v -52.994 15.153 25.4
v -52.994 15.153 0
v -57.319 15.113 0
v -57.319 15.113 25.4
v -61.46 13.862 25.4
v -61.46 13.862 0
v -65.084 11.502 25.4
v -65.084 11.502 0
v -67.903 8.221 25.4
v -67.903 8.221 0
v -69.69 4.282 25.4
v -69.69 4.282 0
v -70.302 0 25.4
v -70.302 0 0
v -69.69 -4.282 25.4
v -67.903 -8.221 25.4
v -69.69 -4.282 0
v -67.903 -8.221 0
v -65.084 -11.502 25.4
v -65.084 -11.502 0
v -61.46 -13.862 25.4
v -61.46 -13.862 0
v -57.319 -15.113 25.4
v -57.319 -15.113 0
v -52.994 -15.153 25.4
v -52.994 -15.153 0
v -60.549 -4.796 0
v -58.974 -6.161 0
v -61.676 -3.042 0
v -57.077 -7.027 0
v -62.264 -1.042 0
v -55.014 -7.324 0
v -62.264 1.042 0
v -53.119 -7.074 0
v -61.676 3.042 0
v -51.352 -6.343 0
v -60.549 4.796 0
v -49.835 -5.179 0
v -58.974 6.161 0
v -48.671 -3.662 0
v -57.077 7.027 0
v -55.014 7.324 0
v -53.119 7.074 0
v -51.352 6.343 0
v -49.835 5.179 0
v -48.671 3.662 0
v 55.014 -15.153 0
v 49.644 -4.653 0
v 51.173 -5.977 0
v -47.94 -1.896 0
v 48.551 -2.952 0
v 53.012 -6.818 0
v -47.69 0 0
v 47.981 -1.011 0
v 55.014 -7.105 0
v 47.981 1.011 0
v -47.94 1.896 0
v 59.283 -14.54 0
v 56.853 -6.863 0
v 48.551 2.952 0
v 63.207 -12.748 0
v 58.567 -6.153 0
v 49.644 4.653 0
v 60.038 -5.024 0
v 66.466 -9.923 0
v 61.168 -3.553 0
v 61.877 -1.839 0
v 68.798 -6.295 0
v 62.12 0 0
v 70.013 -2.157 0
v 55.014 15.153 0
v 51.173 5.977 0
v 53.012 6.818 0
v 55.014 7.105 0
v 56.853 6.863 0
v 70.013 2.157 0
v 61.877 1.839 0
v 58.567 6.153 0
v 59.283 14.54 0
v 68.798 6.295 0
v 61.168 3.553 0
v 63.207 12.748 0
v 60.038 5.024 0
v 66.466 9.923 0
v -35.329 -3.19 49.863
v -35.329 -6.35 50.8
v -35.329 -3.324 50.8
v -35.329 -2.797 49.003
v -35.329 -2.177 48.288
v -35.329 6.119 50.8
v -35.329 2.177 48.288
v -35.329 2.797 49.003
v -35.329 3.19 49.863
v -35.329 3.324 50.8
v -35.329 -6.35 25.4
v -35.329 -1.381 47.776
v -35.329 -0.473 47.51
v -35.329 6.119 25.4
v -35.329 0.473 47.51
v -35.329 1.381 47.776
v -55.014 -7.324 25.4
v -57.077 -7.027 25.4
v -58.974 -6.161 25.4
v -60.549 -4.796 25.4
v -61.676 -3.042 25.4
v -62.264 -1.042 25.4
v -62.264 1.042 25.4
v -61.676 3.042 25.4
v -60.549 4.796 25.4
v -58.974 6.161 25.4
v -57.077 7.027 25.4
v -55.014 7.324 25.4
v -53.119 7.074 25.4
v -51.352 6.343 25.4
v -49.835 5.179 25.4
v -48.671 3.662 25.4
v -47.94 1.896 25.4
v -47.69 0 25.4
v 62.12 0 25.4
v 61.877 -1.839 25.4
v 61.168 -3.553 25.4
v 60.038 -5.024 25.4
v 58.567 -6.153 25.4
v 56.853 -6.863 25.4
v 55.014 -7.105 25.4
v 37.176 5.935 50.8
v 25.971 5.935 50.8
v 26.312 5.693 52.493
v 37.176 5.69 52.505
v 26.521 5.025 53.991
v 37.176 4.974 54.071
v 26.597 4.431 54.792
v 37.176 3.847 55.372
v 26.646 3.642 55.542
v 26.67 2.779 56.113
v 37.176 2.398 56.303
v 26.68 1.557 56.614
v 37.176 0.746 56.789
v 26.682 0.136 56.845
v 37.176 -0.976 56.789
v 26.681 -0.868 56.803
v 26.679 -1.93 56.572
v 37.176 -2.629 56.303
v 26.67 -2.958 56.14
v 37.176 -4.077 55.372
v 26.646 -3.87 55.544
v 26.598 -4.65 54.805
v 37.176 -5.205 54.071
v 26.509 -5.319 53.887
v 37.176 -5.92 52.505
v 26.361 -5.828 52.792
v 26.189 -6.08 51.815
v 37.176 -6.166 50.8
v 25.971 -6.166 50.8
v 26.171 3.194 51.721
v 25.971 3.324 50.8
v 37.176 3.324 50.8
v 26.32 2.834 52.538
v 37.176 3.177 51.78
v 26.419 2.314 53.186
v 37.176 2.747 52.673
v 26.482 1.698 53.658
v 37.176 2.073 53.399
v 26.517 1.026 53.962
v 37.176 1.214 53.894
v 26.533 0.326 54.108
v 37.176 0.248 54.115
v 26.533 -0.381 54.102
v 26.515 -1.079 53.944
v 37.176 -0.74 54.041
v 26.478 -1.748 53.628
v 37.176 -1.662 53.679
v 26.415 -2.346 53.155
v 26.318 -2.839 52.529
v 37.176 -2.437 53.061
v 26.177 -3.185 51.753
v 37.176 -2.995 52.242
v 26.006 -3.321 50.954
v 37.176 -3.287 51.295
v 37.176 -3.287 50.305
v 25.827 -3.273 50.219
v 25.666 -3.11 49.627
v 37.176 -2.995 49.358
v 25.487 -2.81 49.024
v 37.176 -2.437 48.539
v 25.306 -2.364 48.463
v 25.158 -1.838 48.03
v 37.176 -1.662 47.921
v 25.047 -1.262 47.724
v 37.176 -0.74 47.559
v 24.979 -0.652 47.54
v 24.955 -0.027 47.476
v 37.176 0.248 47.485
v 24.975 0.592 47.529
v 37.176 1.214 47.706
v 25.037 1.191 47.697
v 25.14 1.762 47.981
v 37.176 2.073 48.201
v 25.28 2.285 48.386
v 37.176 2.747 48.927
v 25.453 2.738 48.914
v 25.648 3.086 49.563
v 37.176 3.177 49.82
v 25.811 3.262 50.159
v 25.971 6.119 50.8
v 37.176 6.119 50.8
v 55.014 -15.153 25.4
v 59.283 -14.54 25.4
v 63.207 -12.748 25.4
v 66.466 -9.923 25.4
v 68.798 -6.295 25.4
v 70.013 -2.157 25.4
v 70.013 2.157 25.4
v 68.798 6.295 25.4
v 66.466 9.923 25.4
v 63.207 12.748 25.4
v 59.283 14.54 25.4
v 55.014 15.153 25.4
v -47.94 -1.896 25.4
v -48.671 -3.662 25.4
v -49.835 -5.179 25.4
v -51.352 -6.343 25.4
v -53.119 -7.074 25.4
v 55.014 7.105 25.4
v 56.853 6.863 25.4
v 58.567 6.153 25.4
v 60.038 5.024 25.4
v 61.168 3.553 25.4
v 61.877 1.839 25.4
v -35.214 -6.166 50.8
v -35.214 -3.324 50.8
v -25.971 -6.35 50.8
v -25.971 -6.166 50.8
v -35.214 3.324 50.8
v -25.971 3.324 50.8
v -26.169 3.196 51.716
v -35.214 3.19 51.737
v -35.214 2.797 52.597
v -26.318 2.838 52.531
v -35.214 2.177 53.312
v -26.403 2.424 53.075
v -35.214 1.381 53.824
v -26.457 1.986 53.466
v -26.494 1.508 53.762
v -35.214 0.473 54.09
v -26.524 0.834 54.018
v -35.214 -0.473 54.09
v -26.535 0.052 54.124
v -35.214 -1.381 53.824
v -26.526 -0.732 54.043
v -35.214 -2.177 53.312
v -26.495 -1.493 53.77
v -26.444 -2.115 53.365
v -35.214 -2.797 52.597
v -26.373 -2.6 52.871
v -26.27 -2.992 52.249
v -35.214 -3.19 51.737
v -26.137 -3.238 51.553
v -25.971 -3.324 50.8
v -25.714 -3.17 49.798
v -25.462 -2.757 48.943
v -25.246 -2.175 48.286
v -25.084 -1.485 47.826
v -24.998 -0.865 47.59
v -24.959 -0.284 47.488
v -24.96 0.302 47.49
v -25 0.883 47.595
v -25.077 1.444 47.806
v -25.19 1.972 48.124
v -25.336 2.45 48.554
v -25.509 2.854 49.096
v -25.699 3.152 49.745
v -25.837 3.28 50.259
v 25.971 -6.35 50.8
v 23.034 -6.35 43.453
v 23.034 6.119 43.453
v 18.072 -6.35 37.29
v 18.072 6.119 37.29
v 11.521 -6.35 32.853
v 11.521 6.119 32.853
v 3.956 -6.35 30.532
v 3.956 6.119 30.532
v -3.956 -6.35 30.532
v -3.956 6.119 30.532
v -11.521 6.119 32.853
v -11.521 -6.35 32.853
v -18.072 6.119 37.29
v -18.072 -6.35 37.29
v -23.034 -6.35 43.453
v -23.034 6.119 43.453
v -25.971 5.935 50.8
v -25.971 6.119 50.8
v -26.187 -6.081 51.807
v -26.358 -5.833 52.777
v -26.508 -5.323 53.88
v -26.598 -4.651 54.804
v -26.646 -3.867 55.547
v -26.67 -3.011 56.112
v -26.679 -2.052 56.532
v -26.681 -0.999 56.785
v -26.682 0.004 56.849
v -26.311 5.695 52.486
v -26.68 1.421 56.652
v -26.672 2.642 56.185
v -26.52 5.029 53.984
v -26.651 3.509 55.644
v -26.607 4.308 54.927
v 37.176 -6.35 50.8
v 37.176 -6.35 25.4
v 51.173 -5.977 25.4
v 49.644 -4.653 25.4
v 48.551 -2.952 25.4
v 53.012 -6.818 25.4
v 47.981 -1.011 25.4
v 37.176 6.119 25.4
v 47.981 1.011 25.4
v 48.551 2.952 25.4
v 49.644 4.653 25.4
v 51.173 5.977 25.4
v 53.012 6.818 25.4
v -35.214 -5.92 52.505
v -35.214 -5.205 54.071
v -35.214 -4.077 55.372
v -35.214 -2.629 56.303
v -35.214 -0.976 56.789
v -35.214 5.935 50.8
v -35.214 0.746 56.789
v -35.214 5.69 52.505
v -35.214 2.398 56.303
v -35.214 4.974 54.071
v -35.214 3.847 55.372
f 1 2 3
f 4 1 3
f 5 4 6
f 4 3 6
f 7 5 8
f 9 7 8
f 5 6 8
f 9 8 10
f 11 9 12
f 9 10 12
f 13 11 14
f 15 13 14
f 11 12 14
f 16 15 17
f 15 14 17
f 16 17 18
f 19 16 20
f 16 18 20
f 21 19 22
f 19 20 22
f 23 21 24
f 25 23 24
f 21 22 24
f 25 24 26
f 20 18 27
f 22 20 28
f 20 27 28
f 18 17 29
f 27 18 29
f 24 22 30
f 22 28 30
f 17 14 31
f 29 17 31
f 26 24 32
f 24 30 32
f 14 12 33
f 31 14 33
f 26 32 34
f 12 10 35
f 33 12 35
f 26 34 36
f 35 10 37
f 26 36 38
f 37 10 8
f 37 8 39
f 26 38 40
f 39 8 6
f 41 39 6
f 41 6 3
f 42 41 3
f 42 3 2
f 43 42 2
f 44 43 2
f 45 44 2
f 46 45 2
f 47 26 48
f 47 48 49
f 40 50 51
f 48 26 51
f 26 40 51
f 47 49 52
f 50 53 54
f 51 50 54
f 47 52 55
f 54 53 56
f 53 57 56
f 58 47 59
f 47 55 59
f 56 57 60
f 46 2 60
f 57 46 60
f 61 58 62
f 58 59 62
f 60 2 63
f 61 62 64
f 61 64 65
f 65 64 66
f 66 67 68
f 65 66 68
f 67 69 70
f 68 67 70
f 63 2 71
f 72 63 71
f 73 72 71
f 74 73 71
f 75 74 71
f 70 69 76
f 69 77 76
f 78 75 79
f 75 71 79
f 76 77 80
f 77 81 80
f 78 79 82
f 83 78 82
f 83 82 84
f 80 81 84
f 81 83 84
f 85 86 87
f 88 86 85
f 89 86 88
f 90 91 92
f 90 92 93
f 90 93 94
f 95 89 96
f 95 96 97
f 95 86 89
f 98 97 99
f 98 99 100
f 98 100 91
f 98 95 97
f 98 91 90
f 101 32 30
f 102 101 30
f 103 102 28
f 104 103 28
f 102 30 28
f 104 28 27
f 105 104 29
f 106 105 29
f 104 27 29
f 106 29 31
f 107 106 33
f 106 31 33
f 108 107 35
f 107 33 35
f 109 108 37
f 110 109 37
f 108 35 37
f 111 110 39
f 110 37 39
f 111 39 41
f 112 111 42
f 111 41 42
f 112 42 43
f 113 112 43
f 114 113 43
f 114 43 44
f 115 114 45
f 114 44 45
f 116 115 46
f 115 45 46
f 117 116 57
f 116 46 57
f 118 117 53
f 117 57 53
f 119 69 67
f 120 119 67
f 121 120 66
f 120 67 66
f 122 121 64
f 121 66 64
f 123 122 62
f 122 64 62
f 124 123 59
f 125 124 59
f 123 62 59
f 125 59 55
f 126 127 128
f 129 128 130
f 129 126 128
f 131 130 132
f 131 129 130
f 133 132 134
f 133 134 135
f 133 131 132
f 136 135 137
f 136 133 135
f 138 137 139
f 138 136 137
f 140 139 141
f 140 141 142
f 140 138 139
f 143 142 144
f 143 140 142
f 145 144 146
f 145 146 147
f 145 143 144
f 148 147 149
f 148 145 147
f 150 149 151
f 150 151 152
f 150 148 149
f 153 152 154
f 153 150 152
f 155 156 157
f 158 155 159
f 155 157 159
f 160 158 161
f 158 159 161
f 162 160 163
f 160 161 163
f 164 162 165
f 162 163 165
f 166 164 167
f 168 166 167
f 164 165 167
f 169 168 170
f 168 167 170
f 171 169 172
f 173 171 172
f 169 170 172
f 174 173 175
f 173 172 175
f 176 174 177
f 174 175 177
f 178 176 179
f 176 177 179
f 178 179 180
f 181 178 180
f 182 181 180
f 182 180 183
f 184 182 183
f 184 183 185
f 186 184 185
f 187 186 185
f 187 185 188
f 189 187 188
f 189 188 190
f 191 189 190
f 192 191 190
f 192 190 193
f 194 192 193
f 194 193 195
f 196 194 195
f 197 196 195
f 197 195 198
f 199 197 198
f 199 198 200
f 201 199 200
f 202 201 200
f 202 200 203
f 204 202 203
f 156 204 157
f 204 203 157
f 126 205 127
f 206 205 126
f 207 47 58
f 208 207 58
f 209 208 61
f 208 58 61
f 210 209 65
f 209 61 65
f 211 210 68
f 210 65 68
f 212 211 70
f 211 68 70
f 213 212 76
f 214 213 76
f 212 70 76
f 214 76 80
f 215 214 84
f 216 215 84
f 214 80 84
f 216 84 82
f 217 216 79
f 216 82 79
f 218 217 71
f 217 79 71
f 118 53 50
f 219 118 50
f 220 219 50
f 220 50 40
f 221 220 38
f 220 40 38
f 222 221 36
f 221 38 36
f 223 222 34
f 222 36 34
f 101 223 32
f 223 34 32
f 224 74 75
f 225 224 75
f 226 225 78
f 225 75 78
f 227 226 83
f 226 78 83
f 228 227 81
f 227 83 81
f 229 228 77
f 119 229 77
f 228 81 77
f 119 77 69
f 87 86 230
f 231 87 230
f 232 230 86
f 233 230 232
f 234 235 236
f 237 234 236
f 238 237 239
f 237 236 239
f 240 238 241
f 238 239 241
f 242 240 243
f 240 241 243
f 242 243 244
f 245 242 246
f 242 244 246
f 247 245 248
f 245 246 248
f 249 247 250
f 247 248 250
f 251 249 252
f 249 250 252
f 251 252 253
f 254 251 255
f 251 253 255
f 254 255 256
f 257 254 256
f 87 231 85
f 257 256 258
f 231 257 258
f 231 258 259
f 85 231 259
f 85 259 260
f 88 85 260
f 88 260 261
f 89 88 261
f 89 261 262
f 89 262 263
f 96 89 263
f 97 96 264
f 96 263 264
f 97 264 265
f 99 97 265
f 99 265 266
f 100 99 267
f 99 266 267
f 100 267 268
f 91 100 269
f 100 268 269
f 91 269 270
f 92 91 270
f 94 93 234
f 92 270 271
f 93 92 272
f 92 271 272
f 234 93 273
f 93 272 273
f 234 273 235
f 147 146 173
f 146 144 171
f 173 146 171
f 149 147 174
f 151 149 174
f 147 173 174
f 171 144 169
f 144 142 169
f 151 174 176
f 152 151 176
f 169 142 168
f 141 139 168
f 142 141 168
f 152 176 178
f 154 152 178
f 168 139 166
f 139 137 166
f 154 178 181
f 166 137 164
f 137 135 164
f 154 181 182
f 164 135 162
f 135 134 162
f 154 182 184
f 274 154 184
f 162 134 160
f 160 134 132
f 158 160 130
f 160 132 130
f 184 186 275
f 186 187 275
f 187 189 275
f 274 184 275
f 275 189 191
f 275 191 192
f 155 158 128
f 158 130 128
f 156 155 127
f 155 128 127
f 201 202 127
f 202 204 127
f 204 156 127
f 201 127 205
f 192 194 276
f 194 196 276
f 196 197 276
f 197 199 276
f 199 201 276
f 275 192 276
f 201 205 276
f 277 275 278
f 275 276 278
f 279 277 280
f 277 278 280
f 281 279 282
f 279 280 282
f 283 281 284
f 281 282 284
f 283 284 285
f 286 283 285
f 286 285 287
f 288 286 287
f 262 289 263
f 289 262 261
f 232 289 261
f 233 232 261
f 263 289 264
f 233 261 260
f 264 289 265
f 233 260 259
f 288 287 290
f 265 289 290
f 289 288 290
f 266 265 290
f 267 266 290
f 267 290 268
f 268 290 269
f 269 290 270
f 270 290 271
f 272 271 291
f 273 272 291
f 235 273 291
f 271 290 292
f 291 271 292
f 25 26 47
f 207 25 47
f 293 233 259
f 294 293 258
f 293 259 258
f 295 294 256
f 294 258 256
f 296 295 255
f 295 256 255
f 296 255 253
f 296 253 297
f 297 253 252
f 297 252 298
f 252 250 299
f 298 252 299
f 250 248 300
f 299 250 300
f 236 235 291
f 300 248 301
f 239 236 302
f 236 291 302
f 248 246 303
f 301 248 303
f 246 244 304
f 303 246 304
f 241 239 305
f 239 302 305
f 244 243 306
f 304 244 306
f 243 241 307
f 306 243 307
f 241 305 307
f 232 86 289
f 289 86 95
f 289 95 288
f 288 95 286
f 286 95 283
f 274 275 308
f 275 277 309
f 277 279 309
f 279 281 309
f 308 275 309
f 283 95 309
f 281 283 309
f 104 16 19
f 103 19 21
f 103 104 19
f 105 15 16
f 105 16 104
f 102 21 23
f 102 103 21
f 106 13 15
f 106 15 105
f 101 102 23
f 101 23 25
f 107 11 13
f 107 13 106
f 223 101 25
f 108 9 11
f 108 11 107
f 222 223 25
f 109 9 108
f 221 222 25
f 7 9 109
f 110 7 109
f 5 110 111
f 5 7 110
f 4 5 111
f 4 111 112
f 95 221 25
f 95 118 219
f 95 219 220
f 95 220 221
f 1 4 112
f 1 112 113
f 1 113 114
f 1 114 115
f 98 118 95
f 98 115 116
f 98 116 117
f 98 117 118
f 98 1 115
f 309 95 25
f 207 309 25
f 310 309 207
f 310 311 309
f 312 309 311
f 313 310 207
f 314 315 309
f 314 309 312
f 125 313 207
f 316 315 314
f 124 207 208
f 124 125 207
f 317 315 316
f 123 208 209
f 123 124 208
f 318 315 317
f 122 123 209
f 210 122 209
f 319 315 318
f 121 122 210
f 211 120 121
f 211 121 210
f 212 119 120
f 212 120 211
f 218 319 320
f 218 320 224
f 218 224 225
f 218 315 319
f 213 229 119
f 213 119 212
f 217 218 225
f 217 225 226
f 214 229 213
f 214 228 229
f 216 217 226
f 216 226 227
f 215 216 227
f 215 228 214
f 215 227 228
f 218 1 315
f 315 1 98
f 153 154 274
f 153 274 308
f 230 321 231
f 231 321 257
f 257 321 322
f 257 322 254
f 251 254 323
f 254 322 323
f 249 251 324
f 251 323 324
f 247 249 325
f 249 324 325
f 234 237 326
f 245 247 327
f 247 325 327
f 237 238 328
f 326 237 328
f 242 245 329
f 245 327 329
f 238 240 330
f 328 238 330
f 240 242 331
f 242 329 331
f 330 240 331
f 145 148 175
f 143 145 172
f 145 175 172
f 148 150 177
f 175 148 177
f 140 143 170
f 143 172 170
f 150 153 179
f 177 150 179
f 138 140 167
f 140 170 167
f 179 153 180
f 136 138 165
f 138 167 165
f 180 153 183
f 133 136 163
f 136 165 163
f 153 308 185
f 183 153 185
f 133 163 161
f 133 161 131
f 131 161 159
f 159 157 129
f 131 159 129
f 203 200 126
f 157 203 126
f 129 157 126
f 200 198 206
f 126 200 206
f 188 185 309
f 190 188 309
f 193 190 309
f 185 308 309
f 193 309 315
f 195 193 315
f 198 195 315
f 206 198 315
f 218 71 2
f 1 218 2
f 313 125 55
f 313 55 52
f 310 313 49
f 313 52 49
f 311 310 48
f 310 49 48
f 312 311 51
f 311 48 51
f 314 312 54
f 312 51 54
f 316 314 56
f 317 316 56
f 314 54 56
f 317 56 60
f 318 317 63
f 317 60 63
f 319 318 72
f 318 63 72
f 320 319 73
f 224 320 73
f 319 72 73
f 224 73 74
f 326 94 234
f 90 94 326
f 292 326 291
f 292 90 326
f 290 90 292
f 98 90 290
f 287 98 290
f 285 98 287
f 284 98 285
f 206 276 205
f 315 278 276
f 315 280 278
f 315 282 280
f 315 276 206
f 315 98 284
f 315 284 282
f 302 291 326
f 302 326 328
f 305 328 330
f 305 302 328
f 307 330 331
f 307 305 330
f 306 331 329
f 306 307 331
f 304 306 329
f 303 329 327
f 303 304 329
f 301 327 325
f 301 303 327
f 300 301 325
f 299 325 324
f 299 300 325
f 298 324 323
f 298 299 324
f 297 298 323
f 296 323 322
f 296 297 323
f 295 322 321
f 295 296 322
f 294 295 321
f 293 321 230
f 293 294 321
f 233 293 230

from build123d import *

# Parameters (mm, degrees)
F1_DEPTH = 25.4
F2_W     = 72.5054554641
F2_H     = 12.4690914527
F3_DEPTH = 25.4
F5_DEPTH = 72.39
F6_R     = 3.324206073
F7_DEPTH = 107.4789683862
F9_DEPTH = 21.4076038046


with BuildPart() as f1:
    # F0 (on Top) → F1 (new body)
    with BuildSketch(Plane.XY):
        with BuildLine():
            Line((55.0140924752, 15.1534089819), (-52.9936365783, 15.1534089819))
            ThreePointArc((-52.9936365783, 15.1534089819), (-70.3016052161, 0), (-52.9936365783, -15.1534089819))
            Line((-52.9936365783, -15.1534089819), (55.0140924752, -15.1534089819))
            ThreePointArc((55.0140924752, -15.1534089819), (70.167501457, 0), (55.0140924752, 15.1534089819))
        make_face()
        with BuildLine():
            ThreePointArc((-55.0140924752, -7.3239727508), (-62.338065226, 0), (-55.0140924752, 7.3239727508))
            ThreePointArc((-55.0140924752, 7.3239727508), (-49.8352616778, 5.1788307973), (-47.6901197244, 0))
            ThreePointArc((-47.6901197244, 0), (-49.8352616778, -5.1788307973), (-55.0140924752, -7.3239727508))
        make_face(mode=Mode.SUBTRACT)
        with BuildLine():
            ThreePointArc((55.0140924752, -7.1054389054), (47.9086535698, 0), (55.0140924752, 7.1054389054))
            ThreePointArc((55.0140924752, 7.1054389054), (60.0383965085, 5.0243040333), (62.1195313806, 0))
            ThreePointArc((62.1195313806, 0), (60.0383965085, -5.0243040333), (55.0140924752, -7.1054389054))
        make_face(mode=Mode.SUBTRACT)
    extrude(amount=F1_DEPTH)

    # F2 (on face) → F3 (join)
    with BuildSketch(Plane.XY.offset(25.4)):
        with Locations((0.9236354381, -0.1154546626)):
            Rectangle(F2_W, F2_H)
    extrude(amount=F3_DEPTH)

    # F4 (on face) → F5 (join)
    with BuildSketch(Plane.YZ.offset(37.1763631701)):
        with BuildLine():
            Line((3.0379533135, 50.8), (5.9346302823, 50.8))
            ThreePointArc((5.9346302823, 50.8), (-0.1154546626, 56.8500849449), (-6.1655396075, 50.8))
            Line((-6.1655396075, 50.8), (-3.2688626387, 50.8))
            ThreePointArc((-3.2688626387, 50.8), (-0.1154546626, 53.9534079761), (3.0379533135, 50.8))
        make_face()
    extrude(amount=-F5_DEPTH)

    # F6 (on face) → F7 (cut, through all)
    with BuildSketch(Plane.YZ.offset(37.1763631701)):
        with Locations((0, 50.8)):
            Circle(F6_R)
        with BuildLine():
            ThreePointArc((-3.2688626387, 50.8), (-0.1154546626, 53.9534079761), (3.0379533135, 50.8))
            Line((3.0379533135, 50.8), (-3.2688626387, 50.8))
        make_face(mode=Mode.SUBTRACT)
    extrude(amount=-F7_DEPTH, mode=Mode.SUBTRACT)

    # F8 (on face) → F9 (cut, through all)
    with BuildSketch(Plane(origin=(0, 6.1190910637, 0), x_dir=(-1, 0, 0), z_dir=(0, 1, 0))):
        with BuildLine():
            Line((25.97059982, 50.8), (-25.97059982, 50.8))
            ThreePointArc((-25.97059982, 50.8), (0, 30.2373519431), (25.97059982, 50.8))
        make_face()
        with BuildLine():
            ThreePointArc((25.97059982, 50.8), (26.5033603392, 53.8389546874), (26.681742232, 56.9190941751))
            ThreePointArc((26.681742232, 56.9190941751), (-3.0801394877, 83.4224545143), (-25.97059982, 50.8))
            Line((-25.97059982, 50.8), (25.97059982, 50.8))
        make_face()
    extrude(amount=-F9_DEPTH, mode=Mode.SUBTRACT)


solid = f1.part
